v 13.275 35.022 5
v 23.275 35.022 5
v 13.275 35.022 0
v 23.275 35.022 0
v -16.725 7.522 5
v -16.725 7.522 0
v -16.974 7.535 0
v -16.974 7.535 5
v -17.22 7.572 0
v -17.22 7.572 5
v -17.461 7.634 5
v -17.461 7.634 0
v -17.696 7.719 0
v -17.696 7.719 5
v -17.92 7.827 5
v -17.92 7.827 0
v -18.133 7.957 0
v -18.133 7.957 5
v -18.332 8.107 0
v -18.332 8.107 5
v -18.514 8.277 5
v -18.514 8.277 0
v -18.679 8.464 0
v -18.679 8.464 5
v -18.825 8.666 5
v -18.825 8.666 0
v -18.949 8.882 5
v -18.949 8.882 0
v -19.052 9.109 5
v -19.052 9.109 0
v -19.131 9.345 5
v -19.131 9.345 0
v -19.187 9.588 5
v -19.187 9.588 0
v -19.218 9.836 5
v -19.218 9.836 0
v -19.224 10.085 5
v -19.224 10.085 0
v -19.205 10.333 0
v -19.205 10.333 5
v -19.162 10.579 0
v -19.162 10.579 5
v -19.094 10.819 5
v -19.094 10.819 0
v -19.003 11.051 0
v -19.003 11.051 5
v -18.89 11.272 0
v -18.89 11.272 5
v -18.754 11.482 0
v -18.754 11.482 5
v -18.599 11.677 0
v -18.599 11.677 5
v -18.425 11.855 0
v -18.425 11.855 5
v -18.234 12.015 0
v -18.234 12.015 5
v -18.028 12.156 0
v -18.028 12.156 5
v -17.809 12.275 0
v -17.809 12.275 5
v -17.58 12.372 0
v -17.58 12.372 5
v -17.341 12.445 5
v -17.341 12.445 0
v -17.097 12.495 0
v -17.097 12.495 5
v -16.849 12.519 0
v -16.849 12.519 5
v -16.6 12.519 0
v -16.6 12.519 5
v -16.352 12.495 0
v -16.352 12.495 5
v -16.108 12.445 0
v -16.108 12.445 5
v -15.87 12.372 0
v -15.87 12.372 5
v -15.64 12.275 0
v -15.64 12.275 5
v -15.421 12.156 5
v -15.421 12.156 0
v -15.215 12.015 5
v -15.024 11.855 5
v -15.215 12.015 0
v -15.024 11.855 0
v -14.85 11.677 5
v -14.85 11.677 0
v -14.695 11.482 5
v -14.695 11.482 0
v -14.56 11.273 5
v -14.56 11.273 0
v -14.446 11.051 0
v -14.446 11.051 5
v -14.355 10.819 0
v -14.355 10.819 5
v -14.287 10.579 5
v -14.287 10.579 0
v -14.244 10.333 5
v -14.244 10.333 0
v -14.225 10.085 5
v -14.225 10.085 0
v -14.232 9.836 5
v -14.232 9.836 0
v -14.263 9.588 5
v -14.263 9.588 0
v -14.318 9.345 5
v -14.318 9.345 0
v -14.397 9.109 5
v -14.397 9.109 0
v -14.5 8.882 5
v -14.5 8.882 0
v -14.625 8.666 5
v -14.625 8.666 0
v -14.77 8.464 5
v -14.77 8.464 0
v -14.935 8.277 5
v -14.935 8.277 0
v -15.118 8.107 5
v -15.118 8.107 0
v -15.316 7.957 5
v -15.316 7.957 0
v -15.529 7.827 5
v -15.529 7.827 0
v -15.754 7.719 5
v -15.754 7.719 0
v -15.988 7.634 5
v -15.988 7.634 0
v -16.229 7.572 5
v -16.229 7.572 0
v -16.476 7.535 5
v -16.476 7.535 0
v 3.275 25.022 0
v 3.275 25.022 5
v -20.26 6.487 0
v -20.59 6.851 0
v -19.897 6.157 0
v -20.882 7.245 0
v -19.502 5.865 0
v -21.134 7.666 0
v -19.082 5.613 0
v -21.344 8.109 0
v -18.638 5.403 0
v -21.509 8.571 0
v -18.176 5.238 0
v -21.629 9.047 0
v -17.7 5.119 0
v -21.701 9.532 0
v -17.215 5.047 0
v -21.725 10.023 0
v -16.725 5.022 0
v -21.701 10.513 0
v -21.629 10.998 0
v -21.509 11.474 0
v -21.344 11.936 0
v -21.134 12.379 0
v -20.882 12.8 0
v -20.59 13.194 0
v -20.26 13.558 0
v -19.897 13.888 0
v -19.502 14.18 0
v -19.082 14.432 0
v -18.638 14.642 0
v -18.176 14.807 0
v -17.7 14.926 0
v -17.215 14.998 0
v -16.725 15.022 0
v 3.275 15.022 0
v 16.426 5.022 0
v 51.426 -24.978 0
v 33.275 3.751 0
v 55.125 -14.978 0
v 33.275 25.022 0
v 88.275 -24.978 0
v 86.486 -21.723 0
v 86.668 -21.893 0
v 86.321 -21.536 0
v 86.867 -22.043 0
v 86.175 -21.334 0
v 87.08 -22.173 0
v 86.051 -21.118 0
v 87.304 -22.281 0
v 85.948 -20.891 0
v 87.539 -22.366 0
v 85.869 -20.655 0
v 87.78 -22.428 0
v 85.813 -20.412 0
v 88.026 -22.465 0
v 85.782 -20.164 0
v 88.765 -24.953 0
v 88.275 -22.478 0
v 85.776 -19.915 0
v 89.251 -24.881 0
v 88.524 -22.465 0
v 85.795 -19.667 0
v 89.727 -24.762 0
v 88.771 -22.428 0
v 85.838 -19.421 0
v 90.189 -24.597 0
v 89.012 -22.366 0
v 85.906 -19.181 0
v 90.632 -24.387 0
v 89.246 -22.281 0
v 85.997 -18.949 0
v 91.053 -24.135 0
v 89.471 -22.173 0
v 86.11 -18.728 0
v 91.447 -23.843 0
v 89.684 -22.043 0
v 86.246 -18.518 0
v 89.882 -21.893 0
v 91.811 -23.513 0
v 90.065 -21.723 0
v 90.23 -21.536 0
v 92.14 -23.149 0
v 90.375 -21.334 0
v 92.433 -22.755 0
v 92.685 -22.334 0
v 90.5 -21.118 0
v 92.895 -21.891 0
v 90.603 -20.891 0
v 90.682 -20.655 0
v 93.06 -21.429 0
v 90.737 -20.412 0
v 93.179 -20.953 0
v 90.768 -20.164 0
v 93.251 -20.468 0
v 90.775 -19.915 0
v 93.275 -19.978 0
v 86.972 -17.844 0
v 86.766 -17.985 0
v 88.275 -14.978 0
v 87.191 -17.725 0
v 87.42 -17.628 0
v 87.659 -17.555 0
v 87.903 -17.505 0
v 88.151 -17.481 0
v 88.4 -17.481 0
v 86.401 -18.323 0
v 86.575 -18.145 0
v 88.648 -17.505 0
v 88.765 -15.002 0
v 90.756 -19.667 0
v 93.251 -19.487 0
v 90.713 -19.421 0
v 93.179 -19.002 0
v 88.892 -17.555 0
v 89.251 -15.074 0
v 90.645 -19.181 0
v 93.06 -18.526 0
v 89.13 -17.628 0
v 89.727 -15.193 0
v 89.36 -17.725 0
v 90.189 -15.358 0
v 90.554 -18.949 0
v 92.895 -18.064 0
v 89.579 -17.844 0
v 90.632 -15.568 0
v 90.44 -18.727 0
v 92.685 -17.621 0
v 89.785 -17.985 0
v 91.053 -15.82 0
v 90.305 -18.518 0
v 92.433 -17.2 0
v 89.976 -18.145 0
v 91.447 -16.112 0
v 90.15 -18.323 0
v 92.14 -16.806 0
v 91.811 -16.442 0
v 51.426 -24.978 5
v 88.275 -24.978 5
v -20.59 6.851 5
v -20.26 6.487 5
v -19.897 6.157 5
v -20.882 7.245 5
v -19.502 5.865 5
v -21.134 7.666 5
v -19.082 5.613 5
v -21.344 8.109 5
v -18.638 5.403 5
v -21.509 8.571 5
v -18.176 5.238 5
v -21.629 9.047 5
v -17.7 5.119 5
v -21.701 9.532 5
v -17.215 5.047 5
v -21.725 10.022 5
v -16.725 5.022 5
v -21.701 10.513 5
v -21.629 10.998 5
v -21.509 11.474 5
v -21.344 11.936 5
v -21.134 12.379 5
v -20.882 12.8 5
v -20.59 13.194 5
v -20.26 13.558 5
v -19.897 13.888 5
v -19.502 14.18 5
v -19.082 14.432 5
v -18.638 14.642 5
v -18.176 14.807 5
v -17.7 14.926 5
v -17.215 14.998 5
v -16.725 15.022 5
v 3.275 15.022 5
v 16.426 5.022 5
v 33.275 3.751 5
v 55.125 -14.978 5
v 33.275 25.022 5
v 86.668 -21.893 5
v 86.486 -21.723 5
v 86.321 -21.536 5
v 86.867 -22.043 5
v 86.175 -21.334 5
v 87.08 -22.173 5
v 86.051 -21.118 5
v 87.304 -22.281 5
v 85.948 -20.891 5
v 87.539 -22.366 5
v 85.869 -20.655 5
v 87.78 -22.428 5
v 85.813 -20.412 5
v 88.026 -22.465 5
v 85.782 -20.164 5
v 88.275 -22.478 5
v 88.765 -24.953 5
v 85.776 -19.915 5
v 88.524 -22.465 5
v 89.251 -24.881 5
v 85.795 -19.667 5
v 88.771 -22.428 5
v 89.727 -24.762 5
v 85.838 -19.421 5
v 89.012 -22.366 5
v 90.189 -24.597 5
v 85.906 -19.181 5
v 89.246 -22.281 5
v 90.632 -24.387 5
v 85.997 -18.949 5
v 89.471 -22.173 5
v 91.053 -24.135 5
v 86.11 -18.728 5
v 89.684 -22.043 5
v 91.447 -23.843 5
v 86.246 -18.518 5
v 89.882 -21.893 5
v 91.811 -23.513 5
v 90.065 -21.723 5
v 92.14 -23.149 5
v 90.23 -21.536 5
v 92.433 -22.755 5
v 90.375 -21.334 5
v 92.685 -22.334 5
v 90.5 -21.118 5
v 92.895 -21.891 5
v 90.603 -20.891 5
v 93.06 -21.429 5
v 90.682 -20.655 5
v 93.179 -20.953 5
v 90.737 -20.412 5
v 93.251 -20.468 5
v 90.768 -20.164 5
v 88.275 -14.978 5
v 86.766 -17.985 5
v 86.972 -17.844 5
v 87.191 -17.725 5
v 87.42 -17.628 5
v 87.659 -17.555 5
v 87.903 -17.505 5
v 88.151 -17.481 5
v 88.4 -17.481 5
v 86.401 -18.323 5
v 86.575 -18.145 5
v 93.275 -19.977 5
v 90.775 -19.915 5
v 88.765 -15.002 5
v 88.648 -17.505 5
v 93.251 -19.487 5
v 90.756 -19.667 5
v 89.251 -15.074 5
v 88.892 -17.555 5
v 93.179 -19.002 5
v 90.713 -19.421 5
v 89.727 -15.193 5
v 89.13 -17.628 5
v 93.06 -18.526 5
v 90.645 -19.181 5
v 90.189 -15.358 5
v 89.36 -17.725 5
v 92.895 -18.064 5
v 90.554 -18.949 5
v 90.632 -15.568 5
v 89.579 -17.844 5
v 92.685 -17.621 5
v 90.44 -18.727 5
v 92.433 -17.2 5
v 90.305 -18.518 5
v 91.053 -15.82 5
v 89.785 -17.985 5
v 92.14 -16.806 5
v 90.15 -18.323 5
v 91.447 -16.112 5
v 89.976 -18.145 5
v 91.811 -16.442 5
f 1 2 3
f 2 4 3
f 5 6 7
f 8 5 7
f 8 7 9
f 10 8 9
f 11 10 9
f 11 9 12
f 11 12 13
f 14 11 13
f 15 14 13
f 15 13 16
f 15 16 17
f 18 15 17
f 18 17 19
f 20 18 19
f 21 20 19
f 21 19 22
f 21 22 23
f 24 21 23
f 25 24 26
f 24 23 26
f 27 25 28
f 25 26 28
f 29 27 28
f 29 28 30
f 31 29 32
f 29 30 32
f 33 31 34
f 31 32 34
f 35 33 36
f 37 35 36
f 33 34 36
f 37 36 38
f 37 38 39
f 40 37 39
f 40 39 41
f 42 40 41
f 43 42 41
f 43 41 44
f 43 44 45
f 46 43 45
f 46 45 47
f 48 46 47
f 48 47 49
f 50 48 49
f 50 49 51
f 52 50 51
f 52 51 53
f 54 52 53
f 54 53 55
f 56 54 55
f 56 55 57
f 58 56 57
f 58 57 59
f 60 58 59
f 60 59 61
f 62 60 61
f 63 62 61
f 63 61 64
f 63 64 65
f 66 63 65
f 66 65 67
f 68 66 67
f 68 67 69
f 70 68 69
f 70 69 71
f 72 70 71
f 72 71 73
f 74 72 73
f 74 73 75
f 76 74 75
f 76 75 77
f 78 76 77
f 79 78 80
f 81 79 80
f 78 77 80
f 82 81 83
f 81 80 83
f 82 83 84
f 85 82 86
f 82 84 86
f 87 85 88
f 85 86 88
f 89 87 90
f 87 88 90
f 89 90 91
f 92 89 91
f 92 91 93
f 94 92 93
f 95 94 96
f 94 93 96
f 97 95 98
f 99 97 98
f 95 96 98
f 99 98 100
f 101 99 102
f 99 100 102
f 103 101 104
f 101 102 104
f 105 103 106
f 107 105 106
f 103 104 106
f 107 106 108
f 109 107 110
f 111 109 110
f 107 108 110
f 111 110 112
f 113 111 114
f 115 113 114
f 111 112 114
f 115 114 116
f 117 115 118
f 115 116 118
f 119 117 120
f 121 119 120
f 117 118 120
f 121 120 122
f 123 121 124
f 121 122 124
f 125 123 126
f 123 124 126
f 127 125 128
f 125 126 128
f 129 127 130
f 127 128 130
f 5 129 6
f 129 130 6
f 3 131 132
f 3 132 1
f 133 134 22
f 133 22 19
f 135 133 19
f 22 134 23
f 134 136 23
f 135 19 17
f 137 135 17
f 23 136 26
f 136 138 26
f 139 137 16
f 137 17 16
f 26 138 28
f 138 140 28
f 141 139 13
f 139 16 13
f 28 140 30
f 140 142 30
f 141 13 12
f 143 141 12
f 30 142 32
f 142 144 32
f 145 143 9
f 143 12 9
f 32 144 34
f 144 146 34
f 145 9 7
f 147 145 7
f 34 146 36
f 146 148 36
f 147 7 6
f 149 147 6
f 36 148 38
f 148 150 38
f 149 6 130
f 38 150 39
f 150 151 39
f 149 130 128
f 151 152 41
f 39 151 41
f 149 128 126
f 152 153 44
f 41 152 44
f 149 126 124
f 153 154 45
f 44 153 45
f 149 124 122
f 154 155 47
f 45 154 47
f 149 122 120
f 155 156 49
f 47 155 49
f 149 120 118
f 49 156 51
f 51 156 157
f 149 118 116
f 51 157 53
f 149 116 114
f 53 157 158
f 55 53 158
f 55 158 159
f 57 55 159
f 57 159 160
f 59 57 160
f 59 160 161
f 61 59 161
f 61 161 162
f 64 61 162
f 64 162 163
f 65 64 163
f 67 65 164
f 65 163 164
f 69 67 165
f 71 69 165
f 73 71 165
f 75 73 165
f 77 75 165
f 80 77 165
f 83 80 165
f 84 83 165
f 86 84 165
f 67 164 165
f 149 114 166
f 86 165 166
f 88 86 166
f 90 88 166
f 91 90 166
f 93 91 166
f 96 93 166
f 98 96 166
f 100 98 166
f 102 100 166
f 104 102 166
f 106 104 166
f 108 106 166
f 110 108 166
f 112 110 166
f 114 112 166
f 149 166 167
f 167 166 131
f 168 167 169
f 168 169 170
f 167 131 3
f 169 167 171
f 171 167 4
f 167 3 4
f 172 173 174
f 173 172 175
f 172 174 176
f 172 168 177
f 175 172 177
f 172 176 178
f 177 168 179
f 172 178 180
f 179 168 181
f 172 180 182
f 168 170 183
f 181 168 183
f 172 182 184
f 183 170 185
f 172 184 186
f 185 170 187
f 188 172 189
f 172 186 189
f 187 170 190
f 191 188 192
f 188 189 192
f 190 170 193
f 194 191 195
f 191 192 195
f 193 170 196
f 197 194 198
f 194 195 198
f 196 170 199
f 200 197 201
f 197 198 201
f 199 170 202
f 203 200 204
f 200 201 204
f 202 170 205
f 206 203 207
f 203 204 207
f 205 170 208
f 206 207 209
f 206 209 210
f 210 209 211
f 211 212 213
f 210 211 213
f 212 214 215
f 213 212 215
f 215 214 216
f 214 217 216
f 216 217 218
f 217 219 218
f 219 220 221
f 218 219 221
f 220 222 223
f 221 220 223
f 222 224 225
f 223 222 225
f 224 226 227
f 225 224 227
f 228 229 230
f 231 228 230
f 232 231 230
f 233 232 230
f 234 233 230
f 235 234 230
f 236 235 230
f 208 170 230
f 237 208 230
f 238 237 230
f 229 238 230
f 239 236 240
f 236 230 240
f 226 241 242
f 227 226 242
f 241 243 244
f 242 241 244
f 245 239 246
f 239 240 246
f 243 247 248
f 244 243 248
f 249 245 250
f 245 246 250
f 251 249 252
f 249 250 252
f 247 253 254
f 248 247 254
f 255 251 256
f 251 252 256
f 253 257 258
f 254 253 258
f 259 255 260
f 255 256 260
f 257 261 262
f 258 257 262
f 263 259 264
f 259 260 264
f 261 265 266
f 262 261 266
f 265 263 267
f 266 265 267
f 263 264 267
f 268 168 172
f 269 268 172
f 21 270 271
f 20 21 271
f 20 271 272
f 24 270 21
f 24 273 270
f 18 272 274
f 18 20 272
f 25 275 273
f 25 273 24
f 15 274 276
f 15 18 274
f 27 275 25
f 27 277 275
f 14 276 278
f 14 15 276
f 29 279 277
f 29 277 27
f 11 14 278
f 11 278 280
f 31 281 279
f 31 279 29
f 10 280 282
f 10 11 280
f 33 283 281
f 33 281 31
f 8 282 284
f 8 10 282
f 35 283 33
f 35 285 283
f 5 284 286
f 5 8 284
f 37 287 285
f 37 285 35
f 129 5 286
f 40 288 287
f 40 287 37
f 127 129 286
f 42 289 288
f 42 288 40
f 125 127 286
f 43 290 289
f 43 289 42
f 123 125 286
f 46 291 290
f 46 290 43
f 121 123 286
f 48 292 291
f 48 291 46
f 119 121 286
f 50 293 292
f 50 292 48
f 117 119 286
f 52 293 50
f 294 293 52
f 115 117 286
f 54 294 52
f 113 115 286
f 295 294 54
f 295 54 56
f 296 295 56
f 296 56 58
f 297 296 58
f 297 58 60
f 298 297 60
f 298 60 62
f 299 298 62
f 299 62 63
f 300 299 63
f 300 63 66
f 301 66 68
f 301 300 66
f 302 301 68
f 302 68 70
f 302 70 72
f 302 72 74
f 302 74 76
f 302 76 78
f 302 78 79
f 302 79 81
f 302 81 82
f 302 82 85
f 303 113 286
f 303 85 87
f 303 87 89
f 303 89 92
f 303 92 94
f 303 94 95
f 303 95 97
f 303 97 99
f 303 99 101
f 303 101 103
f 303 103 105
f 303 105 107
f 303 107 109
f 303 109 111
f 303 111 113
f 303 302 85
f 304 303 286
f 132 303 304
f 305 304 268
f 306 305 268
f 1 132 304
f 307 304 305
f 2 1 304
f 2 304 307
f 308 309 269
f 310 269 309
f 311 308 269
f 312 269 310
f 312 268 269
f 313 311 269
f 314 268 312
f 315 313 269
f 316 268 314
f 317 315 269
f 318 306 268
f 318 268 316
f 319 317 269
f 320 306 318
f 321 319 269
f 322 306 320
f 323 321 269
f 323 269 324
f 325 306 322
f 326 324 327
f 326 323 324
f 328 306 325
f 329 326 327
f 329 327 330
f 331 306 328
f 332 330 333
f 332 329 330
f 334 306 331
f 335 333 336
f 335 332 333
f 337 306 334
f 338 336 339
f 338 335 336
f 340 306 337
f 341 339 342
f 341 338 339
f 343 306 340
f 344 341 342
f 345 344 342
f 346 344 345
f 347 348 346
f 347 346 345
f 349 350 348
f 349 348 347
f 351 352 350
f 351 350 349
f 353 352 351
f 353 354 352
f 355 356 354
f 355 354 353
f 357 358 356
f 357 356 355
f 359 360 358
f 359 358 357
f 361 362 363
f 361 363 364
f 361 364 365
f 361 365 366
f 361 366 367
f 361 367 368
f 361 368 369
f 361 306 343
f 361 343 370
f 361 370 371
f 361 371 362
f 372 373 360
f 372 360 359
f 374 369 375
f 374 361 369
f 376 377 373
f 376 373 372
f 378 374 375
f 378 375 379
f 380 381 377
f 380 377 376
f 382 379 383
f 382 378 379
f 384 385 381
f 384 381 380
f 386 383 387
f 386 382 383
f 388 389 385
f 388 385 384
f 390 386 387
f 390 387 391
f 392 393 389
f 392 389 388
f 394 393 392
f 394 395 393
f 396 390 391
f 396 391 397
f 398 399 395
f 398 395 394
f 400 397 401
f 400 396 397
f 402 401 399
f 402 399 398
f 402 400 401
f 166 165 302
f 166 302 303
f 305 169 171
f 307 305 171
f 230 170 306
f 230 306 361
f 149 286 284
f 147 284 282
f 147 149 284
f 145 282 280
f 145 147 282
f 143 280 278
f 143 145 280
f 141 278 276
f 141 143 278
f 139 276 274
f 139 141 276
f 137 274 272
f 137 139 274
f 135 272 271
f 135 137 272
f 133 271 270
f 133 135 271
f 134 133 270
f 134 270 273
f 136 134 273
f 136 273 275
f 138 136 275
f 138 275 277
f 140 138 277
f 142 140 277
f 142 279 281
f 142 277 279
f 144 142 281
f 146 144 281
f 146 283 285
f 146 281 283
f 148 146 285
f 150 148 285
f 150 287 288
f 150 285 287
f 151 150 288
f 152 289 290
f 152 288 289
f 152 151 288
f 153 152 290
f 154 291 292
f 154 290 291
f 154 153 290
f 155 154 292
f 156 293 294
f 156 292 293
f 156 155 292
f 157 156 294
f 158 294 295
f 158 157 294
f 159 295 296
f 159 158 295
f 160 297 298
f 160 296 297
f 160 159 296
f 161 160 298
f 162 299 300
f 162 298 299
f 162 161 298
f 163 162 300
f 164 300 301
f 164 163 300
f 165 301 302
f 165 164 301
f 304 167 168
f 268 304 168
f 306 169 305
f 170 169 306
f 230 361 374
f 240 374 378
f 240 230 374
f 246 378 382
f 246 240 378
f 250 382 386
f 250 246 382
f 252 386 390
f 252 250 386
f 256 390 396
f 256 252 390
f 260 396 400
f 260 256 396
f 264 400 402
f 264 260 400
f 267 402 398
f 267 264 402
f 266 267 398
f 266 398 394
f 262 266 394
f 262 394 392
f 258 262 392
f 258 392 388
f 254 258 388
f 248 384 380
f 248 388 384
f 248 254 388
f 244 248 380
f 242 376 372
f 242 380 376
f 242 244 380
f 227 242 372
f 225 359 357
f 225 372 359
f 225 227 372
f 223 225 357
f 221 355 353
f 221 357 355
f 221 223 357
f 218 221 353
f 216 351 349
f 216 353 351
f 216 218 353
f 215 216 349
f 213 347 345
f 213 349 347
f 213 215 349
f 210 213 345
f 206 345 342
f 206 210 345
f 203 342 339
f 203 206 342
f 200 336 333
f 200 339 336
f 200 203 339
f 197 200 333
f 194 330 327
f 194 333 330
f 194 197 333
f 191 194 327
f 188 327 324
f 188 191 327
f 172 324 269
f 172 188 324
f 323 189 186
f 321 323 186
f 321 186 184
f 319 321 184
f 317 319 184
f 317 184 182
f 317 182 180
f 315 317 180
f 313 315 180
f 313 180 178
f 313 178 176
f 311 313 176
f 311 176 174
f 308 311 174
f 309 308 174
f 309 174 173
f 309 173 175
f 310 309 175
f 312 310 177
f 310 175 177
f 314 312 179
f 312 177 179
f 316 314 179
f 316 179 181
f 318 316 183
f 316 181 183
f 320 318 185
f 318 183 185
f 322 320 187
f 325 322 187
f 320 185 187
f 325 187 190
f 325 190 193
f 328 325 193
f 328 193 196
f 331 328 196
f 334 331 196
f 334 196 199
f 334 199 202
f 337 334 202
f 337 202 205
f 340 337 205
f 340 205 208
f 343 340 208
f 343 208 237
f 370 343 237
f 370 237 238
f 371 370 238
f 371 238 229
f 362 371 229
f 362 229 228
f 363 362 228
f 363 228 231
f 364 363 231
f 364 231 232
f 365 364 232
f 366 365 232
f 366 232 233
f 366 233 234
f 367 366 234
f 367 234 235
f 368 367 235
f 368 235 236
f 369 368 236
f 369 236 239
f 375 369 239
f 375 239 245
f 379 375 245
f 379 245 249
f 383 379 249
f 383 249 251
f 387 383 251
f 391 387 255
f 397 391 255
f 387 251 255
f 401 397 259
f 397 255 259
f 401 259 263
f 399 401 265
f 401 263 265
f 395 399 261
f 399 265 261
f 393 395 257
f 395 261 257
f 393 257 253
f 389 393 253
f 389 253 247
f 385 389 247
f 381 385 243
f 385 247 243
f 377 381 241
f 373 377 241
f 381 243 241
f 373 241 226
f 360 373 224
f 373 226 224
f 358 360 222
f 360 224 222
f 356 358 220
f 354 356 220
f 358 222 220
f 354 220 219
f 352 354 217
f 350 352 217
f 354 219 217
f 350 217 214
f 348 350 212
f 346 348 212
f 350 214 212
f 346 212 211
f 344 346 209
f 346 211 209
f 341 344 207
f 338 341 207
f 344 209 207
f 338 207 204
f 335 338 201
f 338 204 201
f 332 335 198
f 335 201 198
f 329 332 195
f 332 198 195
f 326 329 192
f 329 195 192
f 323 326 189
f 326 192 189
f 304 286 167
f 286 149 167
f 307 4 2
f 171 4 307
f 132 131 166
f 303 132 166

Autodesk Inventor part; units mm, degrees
ref_plane "YZ Plane" through (0, 0, 0) normal (1, 0, 0) x (0, 1, 0)
ref_plane "XZ Plane" through (0, 0, 0) normal (0, 1, 0) x (-1, 0, 0)
ref_plane "XY Plane" through (0, 0, 0) normal (0, 0, 1) x (1, 0, 0)
sketch "Sketch1" plane through (0, 0, 0) normal (0, 0, 1) x (1, 0, 0)
  line L0 (-16.7246, 10.0225) -> (18.2754, 10.0225) construction
  line L1 (53.2754, -19.9775) -> (88.2754, -19.9775) construction
  line L2 (18.2754, 10.0225) -> (53.2754, -19.9775) construction
  line L3 (33.2754, 3.7508) -> (55.125, -14.9775)
  line L4 (55.125, -14.9775) -> (88.2754, -14.9775)
  line L5 (-16.7246, 5.0225) -> (16.4258, 5.0225)
  line L6 (16.4258, 5.0225) -> (51.4258, -24.9775)
  line L7 (51.4258, -24.9775) -> (88.2754, -24.9775)
  line L8 (-21.7246, 10.0225) -> (-21.7246, 10.0225)
  line L9 (93.2754, -19.9775) -> (93.2754, -19.9775)
  arc A0 (-21.7246, 10.0225) -> (-16.7246, 5.0225) centre (-16.7246, 10.0225) ccw
  arc A1 (-16.7246, 15.0225) -> (-21.7246, 10.0225) centre (-16.7246, 10.0225) ccw
  arc A2 (88.2754, -24.9775) -> (93.2754, -19.9775) centre (88.2754, -19.9775) ccw
  arc A3 (93.2754, -19.9775) -> (88.2754, -14.9775) centre (88.2754, -19.9775) ccw
  line L10 (33.2754, 3.7508) -> (33.2754, 25.0225)
  line L11 (23.2754, 35.0225) -> (13.2754, 35.0225)
  line L12 (3.2754, 25.0225) -> (3.2754, 15.0225)
  line L13 (18.2754, 10.0225) -> (18.2754, 35.0225) construction
  line L14 (18.2754, 10.0225) -> (43.2754, 10.0225) construction
  line L15 (3.2754, 25.0225) -> (13.2754, 35.0225)
  line L16 (23.2754, 35.0225) -> (33.2754, 25.0225)
  line L17 (-16.7246, 15.0225) -> (3.2754, 15.0225)
  point P0 (0, 0)
  point P1 (25.9584, 10.0225)
  point P2 (93.2754, -19.9775)
  point P3 (33.2754, 35.0225)
  point P4 (3.2754, 35.0225)
  dimension "d0" = 35
  dimension "d4" = 35
  dimension "d5" = 35
  dimension "d6" = 30
  dimension "d8" = 5
  dimension "d10" = 5
  dimension "d11" = 5
  dimension "d12" = 5
  dimension "d22" = 5
  dimension "d23" = 5
  dimension "d24" = 5
  dimension "d25" = 5
  dimension "d26" = 20
  dimension "d29" = 15
  dimension "d30" = 10
  dimension "d31" = 10
  dimension "d32" = 10
  dimension "d33" = 10
extrude "Extrusion1" add sketch "Sketch1" along normal blind 5
sketch "Sketch2" plane through (0, 0, 5) normal (0, 0, 1) x (1, 0, 0)
  arc A0 (-16.7246, 15.0225) -> (-16.7246, 5.0225) centre (-16.7246, 10.0225) ccw projected
  arc A1 (88.2754, -24.9775) -> (88.2754, -14.9775) centre (88.2754, -19.9775) ccw projected
  point P0 (0, 0)
hole "Hole1" at (-16.7246, 10.0225, 5) at (88.2754, -19.9775, 5) direction (0, 0, -1) diameter 5 end through all
sketch "Sketch3" plane through (0, 0, 5) normal (0, 0, 1) x (1, 0, 0)
  circle A0 centre (18.2559, 19.7273) radius 12.5 construction
  point P0 (0, 0)
  dimension "d34" = 25
equation "\"d31\" = d30"
equation "\"d32\" = d30"
equation "\"d33\" = d32"
properties part number "BrazoTV2" material "MDF Medium Density Fiberboard"
